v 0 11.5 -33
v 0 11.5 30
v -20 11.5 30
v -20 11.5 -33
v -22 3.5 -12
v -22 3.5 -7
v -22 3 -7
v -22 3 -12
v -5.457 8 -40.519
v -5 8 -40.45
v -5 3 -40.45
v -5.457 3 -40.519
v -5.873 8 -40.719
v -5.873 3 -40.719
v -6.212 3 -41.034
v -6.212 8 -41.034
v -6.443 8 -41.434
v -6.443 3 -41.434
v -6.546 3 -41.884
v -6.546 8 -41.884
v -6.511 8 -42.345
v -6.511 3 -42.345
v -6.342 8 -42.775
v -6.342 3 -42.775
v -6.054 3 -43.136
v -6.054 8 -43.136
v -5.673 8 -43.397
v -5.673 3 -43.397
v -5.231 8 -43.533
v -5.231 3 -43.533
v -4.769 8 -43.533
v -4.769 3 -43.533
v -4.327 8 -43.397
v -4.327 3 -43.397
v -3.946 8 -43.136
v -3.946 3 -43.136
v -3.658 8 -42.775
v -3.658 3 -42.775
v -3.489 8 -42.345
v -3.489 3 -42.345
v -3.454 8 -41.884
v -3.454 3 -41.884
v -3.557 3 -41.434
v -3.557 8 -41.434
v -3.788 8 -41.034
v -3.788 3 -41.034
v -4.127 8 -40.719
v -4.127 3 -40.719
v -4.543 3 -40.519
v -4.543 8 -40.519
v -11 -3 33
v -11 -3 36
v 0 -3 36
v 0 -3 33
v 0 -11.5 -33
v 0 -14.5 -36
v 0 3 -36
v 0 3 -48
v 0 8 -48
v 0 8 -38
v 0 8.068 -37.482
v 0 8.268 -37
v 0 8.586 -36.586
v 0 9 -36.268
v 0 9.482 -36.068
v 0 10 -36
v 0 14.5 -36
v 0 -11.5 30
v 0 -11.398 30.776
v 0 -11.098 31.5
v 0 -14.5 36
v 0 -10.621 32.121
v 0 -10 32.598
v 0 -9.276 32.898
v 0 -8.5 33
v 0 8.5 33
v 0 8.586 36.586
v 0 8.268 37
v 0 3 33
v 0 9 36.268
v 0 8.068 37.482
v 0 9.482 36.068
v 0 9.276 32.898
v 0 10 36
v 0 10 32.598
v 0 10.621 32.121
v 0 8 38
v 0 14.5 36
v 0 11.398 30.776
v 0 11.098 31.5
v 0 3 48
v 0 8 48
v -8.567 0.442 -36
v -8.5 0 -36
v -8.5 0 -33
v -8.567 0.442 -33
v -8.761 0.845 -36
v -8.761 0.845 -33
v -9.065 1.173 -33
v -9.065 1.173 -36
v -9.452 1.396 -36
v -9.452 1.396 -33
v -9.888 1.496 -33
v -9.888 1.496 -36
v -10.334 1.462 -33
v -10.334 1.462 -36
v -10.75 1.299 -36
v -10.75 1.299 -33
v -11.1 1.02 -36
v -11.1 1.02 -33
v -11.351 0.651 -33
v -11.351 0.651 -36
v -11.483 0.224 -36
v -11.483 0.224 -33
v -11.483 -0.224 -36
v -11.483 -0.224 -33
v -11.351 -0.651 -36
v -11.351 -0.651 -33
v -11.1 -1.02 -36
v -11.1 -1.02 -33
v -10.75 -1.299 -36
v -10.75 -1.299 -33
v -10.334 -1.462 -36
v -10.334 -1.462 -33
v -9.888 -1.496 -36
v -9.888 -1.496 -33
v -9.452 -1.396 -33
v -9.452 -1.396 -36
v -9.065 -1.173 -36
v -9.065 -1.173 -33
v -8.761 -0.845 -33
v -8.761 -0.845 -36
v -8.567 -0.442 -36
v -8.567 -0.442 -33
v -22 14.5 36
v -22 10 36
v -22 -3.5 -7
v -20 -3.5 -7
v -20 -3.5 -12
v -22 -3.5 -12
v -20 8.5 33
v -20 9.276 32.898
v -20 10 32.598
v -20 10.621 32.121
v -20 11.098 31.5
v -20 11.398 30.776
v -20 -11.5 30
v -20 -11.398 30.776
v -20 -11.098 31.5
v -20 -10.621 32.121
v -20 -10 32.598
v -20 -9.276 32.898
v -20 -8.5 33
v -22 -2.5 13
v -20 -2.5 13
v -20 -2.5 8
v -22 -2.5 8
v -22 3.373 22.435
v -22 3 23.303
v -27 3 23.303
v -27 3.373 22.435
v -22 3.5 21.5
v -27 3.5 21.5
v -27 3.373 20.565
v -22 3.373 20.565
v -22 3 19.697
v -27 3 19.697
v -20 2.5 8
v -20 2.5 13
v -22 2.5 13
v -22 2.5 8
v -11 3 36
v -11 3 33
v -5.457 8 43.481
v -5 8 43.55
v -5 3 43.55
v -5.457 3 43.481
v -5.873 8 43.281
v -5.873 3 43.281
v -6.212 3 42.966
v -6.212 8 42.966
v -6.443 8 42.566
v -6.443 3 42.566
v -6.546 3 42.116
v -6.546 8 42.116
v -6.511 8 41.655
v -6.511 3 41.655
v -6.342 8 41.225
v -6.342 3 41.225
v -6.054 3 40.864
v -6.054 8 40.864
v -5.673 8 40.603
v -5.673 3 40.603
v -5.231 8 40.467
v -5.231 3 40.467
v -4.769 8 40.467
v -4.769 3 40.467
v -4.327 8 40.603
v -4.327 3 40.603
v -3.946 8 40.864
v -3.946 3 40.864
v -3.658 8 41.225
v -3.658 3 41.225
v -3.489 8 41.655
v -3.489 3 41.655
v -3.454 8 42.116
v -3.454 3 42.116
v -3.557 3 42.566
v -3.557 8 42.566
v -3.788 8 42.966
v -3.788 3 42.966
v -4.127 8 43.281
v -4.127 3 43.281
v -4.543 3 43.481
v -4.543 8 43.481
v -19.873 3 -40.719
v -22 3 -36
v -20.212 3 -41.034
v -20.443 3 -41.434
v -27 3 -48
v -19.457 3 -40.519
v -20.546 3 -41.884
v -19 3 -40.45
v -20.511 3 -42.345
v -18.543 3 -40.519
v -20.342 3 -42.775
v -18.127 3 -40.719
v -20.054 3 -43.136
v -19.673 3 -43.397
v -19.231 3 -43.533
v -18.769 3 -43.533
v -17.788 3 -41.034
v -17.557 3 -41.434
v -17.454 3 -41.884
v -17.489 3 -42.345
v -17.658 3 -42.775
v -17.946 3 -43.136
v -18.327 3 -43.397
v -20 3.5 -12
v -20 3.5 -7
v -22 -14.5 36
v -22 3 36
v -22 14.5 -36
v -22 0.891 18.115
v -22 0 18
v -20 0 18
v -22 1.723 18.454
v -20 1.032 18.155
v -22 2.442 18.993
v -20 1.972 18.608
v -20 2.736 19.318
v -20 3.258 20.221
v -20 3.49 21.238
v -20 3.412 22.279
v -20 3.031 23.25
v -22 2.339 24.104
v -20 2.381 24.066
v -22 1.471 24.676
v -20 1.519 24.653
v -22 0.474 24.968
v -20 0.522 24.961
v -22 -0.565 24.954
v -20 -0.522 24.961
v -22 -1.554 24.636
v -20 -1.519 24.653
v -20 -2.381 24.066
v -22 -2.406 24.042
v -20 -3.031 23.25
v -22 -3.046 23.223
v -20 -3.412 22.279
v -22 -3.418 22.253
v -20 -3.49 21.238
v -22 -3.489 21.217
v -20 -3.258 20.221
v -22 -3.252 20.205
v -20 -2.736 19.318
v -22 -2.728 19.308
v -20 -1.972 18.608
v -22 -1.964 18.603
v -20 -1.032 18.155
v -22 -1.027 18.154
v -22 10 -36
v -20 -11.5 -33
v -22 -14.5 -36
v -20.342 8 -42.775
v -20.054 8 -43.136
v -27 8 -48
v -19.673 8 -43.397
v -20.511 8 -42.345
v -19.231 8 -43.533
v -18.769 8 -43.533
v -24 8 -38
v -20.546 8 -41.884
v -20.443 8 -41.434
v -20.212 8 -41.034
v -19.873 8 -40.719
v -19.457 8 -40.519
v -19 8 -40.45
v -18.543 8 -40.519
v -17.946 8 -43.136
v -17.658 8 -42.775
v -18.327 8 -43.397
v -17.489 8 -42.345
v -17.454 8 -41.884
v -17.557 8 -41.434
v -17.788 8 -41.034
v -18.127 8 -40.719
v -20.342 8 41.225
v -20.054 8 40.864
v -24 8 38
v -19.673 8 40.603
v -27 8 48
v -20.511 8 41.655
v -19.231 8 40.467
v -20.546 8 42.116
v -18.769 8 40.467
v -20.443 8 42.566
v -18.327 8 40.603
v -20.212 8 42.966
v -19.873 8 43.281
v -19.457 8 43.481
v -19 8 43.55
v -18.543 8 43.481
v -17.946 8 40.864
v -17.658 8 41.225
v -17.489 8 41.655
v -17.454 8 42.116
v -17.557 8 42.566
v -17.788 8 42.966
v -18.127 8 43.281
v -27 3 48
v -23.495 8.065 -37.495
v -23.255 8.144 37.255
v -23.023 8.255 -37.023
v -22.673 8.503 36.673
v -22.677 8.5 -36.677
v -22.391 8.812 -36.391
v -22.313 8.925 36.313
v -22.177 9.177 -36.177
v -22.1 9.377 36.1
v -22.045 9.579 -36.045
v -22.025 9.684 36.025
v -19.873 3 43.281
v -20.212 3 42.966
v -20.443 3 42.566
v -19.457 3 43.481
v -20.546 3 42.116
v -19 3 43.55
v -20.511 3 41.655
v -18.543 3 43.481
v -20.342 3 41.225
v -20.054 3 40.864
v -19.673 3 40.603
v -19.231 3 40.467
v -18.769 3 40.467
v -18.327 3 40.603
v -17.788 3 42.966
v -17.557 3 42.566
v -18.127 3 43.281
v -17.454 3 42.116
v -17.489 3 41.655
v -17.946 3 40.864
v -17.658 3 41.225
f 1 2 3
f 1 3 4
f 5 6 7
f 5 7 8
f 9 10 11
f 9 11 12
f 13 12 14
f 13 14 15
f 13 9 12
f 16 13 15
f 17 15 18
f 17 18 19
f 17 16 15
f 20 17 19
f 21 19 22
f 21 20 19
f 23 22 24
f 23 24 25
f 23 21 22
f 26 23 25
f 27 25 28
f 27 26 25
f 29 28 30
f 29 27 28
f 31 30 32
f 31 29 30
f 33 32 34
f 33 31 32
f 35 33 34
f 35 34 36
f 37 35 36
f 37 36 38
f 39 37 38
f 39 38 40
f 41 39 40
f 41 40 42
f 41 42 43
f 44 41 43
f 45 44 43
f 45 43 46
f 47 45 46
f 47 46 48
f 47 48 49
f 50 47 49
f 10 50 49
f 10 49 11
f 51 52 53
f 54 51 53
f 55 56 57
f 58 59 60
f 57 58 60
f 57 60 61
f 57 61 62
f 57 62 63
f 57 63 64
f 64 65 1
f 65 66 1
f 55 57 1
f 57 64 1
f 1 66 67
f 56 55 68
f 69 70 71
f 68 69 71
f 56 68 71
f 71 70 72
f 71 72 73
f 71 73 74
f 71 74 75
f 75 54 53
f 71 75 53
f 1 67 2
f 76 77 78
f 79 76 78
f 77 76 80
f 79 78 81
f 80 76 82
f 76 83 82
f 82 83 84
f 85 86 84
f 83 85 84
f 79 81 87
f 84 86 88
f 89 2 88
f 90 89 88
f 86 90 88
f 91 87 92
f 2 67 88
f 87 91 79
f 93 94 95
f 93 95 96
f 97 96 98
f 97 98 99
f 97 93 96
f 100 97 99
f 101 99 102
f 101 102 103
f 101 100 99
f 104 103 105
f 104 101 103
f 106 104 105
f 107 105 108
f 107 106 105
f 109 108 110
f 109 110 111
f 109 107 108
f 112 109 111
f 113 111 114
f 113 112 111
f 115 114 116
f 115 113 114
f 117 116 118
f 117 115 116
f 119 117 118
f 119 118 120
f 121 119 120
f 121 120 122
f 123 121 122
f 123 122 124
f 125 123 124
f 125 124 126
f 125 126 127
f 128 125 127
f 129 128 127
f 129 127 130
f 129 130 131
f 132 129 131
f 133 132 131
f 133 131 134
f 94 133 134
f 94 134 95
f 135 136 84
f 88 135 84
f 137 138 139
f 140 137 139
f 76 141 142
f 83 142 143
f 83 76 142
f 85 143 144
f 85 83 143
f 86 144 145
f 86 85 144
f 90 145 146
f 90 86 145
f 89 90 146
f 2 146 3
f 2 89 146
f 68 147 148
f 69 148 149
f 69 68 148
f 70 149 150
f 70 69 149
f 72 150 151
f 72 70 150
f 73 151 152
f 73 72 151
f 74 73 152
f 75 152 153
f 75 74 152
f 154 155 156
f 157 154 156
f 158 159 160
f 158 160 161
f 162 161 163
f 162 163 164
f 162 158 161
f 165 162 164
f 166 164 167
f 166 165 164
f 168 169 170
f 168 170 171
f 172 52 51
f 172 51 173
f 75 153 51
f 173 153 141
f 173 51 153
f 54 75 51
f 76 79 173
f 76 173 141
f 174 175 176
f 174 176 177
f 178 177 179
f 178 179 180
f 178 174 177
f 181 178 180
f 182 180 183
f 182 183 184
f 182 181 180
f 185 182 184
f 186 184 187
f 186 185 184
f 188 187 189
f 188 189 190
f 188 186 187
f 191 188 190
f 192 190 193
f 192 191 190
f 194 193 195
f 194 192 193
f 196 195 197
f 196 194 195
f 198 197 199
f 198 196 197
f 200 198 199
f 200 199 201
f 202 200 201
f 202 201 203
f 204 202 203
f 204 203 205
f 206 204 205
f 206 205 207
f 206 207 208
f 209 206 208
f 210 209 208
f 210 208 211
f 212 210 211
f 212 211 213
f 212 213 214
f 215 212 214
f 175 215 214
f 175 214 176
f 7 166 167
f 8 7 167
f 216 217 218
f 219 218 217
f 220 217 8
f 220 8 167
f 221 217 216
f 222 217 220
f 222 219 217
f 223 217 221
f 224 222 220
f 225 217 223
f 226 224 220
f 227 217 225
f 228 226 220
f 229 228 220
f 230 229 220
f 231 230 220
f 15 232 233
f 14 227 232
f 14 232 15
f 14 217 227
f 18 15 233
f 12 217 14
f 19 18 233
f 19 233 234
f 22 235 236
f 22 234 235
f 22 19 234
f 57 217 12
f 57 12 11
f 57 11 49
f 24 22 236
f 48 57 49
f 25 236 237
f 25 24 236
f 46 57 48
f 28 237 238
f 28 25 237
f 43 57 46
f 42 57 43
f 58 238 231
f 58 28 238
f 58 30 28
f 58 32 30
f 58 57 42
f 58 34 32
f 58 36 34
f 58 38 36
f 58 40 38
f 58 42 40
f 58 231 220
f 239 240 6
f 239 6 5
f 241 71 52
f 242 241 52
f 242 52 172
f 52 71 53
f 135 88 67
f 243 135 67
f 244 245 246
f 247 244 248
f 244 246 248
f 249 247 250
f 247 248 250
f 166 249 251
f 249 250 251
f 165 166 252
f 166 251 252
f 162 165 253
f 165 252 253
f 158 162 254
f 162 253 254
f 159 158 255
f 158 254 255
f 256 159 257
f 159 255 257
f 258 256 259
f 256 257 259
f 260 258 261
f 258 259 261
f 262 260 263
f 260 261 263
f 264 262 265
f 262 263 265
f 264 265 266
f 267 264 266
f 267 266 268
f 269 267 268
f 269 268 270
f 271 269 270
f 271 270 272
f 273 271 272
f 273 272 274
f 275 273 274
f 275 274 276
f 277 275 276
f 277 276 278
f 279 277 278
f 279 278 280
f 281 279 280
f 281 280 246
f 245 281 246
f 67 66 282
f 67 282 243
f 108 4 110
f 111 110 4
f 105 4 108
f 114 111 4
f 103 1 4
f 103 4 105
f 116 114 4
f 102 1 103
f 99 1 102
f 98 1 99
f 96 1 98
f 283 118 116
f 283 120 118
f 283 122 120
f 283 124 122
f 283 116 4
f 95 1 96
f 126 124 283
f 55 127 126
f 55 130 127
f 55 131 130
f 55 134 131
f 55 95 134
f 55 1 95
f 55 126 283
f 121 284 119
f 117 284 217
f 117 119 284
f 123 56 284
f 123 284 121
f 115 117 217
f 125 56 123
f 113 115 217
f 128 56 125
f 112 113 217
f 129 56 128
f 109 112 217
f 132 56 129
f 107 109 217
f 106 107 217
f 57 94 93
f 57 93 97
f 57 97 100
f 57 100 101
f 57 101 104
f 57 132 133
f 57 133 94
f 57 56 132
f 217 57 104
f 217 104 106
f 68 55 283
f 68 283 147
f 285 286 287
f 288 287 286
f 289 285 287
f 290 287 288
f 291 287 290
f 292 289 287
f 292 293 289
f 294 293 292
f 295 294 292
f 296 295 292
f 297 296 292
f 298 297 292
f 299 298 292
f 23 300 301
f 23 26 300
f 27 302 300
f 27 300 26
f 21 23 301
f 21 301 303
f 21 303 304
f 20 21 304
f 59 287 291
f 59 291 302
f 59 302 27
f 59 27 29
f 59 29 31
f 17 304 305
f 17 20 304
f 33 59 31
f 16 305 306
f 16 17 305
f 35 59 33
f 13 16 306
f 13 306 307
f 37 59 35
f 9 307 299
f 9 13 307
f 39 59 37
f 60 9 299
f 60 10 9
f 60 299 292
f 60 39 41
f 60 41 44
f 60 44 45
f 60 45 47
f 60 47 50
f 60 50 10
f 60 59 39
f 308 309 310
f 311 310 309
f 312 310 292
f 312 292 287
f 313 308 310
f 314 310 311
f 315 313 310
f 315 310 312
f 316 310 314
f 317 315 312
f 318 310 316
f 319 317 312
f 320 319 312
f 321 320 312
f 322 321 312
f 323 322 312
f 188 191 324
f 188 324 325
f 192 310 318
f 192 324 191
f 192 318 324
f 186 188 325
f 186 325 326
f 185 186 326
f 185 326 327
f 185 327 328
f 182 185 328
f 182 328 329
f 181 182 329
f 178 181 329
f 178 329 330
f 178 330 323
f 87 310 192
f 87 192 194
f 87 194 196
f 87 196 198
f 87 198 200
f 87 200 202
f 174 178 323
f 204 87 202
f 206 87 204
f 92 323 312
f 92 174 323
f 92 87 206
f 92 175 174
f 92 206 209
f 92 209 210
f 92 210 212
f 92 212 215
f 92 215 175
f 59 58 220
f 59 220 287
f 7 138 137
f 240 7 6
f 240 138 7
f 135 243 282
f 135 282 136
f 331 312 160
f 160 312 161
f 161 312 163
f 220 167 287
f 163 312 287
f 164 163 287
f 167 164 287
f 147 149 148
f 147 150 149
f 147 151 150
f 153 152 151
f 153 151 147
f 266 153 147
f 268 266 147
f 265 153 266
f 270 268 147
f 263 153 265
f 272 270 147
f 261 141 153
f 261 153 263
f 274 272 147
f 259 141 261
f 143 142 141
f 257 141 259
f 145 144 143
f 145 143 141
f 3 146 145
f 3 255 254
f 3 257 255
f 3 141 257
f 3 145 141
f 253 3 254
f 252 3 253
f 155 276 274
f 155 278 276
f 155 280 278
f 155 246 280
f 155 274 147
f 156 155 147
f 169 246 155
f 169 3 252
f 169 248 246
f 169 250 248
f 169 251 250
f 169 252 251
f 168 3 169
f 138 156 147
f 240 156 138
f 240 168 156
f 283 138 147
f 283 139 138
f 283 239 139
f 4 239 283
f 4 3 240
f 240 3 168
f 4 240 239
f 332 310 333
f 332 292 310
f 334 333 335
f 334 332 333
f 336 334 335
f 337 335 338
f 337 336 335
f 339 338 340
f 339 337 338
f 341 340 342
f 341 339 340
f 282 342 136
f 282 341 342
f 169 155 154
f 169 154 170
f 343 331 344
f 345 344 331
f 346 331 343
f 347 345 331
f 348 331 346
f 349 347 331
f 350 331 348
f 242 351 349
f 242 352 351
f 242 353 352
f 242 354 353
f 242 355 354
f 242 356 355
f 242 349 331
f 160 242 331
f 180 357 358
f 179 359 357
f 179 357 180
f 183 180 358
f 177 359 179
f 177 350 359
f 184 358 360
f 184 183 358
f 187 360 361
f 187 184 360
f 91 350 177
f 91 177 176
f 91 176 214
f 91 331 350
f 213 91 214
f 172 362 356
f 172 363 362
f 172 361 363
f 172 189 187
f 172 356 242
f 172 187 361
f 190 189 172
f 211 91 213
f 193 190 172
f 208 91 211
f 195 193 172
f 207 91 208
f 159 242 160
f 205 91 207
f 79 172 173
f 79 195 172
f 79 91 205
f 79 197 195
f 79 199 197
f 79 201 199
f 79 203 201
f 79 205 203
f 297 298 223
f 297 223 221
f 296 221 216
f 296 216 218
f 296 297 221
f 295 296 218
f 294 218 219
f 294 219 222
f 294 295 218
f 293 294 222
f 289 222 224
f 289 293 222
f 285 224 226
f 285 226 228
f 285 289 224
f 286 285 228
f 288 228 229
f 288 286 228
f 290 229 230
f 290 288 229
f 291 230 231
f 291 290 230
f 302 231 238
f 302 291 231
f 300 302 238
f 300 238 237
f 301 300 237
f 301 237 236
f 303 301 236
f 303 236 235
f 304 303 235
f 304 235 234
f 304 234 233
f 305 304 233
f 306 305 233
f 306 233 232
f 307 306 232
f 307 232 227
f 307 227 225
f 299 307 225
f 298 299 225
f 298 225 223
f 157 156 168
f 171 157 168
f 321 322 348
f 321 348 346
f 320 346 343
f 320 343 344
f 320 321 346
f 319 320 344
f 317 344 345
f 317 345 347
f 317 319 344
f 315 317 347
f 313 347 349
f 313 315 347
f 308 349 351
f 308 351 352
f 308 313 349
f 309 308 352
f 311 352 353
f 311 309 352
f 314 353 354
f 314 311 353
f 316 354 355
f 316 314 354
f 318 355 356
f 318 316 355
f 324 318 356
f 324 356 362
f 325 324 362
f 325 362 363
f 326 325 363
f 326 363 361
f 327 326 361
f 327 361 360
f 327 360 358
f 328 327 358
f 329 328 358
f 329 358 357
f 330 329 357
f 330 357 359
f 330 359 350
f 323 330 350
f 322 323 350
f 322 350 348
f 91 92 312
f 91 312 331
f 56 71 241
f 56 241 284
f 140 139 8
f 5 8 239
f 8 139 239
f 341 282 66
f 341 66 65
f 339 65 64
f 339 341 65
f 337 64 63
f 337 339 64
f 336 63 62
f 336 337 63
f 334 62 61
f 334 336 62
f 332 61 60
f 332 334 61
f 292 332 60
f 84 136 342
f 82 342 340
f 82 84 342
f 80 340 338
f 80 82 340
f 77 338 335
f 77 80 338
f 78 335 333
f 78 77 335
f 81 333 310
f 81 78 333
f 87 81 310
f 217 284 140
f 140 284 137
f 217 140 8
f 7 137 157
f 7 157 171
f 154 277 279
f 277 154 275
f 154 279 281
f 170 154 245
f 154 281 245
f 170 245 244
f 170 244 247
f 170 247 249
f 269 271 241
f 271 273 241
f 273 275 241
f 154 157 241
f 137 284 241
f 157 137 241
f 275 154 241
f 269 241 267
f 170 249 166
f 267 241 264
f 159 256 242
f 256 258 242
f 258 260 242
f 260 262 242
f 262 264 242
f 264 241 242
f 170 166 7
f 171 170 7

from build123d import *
from build123d.topology import SkipClean

# Parameters (mm, degrees)
SKETCH_1_W             = 72
SKETCH_1_H             = 29
EXTRUDE_1_DEPTH        = 20
CUT_EXTRUDE_1_REACH    = 78.12
SKETCH_2_W             = 11
SKETCH_2_H             = 6
CUT_EXTRUDE_2_REACH    = 78.12
SKETCH_3_R             = 1.5
SKETCH_4_W             = 72
SKETCH_4_H             = 29
SKETCH_4_R             = 3.5
SKETCH_4_W_2           = 5
SKETCH_4_H_2           = 5
SKETCH_4_H_3           = 7
EXTRUDE_2_DEPTH        = 2
SKETCH_6_W             = 22
SKETCH_6_H             = 5
EXTRUDE_3_DEPTH        = 12
SKETCH_7_W             = 22
SKETCH_7_H             = 5
EXTRUDE_4_DEPTH        = 12
EXTRUDE_5_DEPTH        = 5
CUT_EXTRUDE_4_REACH    = 61.492
SKETCH_10_R            = 1.55
FILLET_1_R             = 2
FILLET_1_OF_MIRROR_4_R = 2
SKETCH_11_W            = 152.939509244
SKETCH_11_H            = 68.45292135
CUT_EXTRUDE_5_DEPTH    = 27


with BuildPart() as part:
    # 草圖1 → 填料-伸長1 (new body)
    with BuildSketch(Plane(origin=(0, 0, 0), x_dir=(0, 0, -1), z_dir=(1, 0, 0))):
        Rectangle(SKETCH_1_W, SKETCH_1_H)
        with BuildLine():
            Line((-30, 11.5), (33, 11.5))
            Line((33, 11.5), (33, -11.5))
            Line((33, -11.5), (-30, -11.5))
            ThreePointArc((-30, -11.5), (-32.121320344, -10.621320344), (-33, -8.5))
            Line((-33, -8.5), (-33, 8.5))
            ThreePointArc((-33, 8.5), (-32.121320344, 10.621320344), (-30, 11.5))
        make_face(mode=Mode.SUBTRACT)
    extrude_1 = extrude(amount=EXTRUDE_1_DEPTH)

    # 草圖2 → 除料-伸長1 (cut, up to next)
    with BuildSketch(Plane.XY.offset(36), mode=Mode.PRIVATE) as cut_extrude_1_sk1:
        with Locations((5.5, 0)):
            Rectangle(SKETCH_2_W, SKETCH_2_H)
    cut_extrude_1_tool1 = extrude(cut_extrude_1_sk1.sketch, amount=-CUT_EXTRUDE_1_REACH, mode=Mode.PRIVATE) & part.part
    cut_extrude_1 = cut_extrude_1_tool1.solids().sort_by_distance((5.5, 0, 36))[0]
    add(cut_extrude_1, mode=Mode.SUBTRACT)

    # 草圖3 → 除料-伸長2 (cut, up to next)
    with BuildSketch(Plane(origin=(0, 0, -36), x_dir=(-1, 0, 0), z_dir=(0, 0, -1)), mode=Mode.PRIVATE) as cut_extrude_2_sk1:
        with Locations((-10, 0)):
            Circle(SKETCH_3_R)
    cut_extrude_2_tool1 = extrude(cut_extrude_2_sk1.sketch, amount=-CUT_EXTRUDE_2_REACH, mode=Mode.PRIVATE) & part.part
    cut_extrude_2 = cut_extrude_2_tool1.solids().sort_by_distance((10, 0, -36))[0]
    add(cut_extrude_2, mode=Mode.SUBTRACT)

    # 草圖4 → 填料-伸長2 (add)
    with BuildSketch(Plane(origin=(20, 0, 0), x_dir=(0, 0, -1), z_dir=(1, 0, 0))):
        Rectangle(SKETCH_4_W, SKETCH_4_H)
        with Locations((-21.5, 0)):
            Circle(SKETCH_4_R, mode=Mode.SUBTRACT)
        with Locations((-10.5, 0)):
            Rectangle(SKETCH_4_W_2, SKETCH_4_H_2, mode=Mode.SUBTRACT)
        with Locations((9.5, 0)):
            Rectangle(SKETCH_4_W_2, SKETCH_4_H_3, mode=Mode.SUBTRACT)
    extrude_2 = extrude(amount=EXTRUDE_2_DEPTH)

    # 草圖6 → 填料-伸長3 (add)
    with BuildSketch(Plane.XY.offset(36)):
        with Locations((11, 5.5)):
            Rectangle(SKETCH_6_W, SKETCH_6_H)
    extrude_3 = extrude(amount=EXTRUDE_3_DEPTH)

    # 草圖7 → 填料-伸長4 (add)
    with BuildSketch(Plane(origin=(0, 0, -36), x_dir=(-1, 0, 0), z_dir=(0, 0, -1))):
        with Locations((-11, 5.5)):
            Rectangle(SKETCH_7_W, SKETCH_7_H)
    extrude_4 = extrude(amount=EXTRUDE_4_DEPTH)

    # 草圖9 → 填料-伸長5 (add)
    with SkipClean():  # the faces are left unmerged after this step: merging them gives an invalid solid
        with BuildSketch(Plane(origin=(22, 0, 0), x_dir=(0, 0, -1), z_dir=(1, 0, 0))):
            with BuildLine():
                Line((-48, 3), (-23.302775638, 3))
                ThreePointArc((-23.302775638, 3), (-21.5, 3.5), (-19.697224362, 3))
                Line((-19.697224362, 3), (48, 3))
                Line((48, 3), (48, 8))
                Line((48, 8), (-48, 8))
                Line((-48, 8), (-48, 3))
            make_face()
        extrude_5 = extrude(amount=EXTRUDE_5_DEPTH)

    # 草圖10 → 除料-伸長4 (cut, up to next)
    with BuildSketch(Plane(origin=(0, 8, 0), x_dir=(1, 0, 0), z_dir=(0, 1, 0)), mode=Mode.PRIVATE) as cut_extrude_4_sk1:
        with Locations(Location((5, -42, 0), (0, 0, 270))):
            Circle(SKETCH_10_R)
    cut_extrude_4_tool1 = extrude(cut_extrude_4_sk1.sketch, amount=-CUT_EXTRUDE_4_REACH, mode=Mode.PRIVATE) & part.part
    # 草圖10 → 除料-伸長4 (cut, up to next)
    with BuildSketch(Plane(origin=(0, 8, 0), x_dir=(1, 0, 0), z_dir=(0, 1, 0)), mode=Mode.PRIVATE) as cut_extrude_4_sk2:
        with Locations(Location((19, -42, 0), (0, 0, 270))):
            Circle(SKETCH_10_R)
    cut_extrude_4_tool2 = extrude(cut_extrude_4_sk2.sketch, amount=-CUT_EXTRUDE_4_REACH, mode=Mode.PRIVATE) & part.part
    # 草圖10 → 除料-伸長4 (cut, up to next)
    with BuildSketch(Plane(origin=(0, 8, 0), x_dir=(1, 0, 0), z_dir=(0, 1, 0)), mode=Mode.PRIVATE) as cut_extrude_4_sk3:
        with Locations(Location((19, 42, 0), (0, 0, 270))):
            Circle(SKETCH_10_R)
    cut_extrude_4_tool3 = extrude(cut_extrude_4_sk3.sketch, amount=-CUT_EXTRUDE_4_REACH, mode=Mode.PRIVATE) & part.part
    # 草圖10 → 除料-伸長4 (cut, up to next)
    with BuildSketch(Plane(origin=(0, 8, 0), x_dir=(1, 0, 0), z_dir=(0, 1, 0)), mode=Mode.PRIVATE) as cut_extrude_4_sk4:
        with Locations(Location((5, 42, 0), (0, 0, 270))):
            Circle(SKETCH_10_R)
    cut_extrude_4_tool4 = extrude(cut_extrude_4_sk4.sketch, amount=-CUT_EXTRUDE_4_REACH, mode=Mode.PRIVATE) & part.part
    cut_extrude_4_1 = cut_extrude_4_tool1.solids().sort_by_distance((5, 8, 42))[0]
    add(cut_extrude_4_1, mode=Mode.SUBTRACT)
    cut_extrude_4_2 = cut_extrude_4_tool2.solids().sort_by_distance((19, 8, 42))[0]
    add(cut_extrude_4_2, mode=Mode.SUBTRACT)
    cut_extrude_4_3 = cut_extrude_4_tool3.solids().sort_by_distance((19, 8, -42))[0]
    add(cut_extrude_4_3, mode=Mode.SUBTRACT)
    cut_extrude_4_4 = cut_extrude_4_tool4.solids().sort_by_distance((5, 8, -42))[0]
    add(cut_extrude_4_4, mode=Mode.SUBTRACT)
    cut_extrude_4 = cut_extrude_4_1 + cut_extrude_4_2 + cut_extrude_4_3 + cut_extrude_4_4  # 除料-伸長4 as one shape, for the pattern or mirror that repeats it

    # 圓角1
    # the kernel refuses this fillet: 2 mm, written as the material it adds along each edge
    with BuildSketch(Plane(origin=(22, 8, -36), x_dir=(0, 1, 0), z_dir=(-1, 0, 0)), Plane(origin=(0, 8, 36), x_dir=(0, 1, 0), z_dir=(1, 0, 0))) as fillet_1_piece_1:
        with BuildLine():
            CenterArc((FILLET_1_R, FILLET_1_R), FILLET_1_R, 180, 90)
            Line((0, FILLET_1_R), (0, 0))
            Line((0, 0), (FILLET_1_R, 0))
        make_face()
    extrude(amount=22)
    with BuildSketch(Plane(origin=(22, 8, -36), x_dir=(0, 1, 0), z_dir=(0, 0, 1))) as fillet_1_piece_2:
        with BuildLine():
            CenterArc((FILLET_1_R, -FILLET_1_R), FILLET_1_R, 90, 90)
            Line((0, -FILLET_1_R), (0, 0))
            Line((0, 0), (FILLET_1_R, 0))
        make_face()
    extrude(amount=72)
    with BuildSketch(Plane(origin=(22, 8, -41), x_dir=(0, 1, 0), z_dir=(0, 0, 1))) as fillet_1_piece_3a_section:
        with BuildLine():
            CenterArc((FILLET_1_R, -FILLET_1_R), FILLET_1_R, 90, 90)
            Line((0, -FILLET_1_R), (0, 0))
            Line((0, 0), (FILLET_1_R, 0))
        make_face()
    fillet_1_piece_3a = extrude(amount=77, mode=Mode.PRIVATE)
    fillet_1_piece_3a = split(fillet_1_piece_3a, bisect_by=Plane(origin=(22.452790229, 8.452790229, -36), z_dir=(0, 0, -1)), keep=Keep.TOP, mode=Mode.PRIVATE)
    with BuildSketch(Plane(origin=(27, 8, -36), x_dir=(0, 1, 0), z_dir=(-1, 0, 0))) as fillet_1_piece_3b_section:
        with BuildLine():
            CenterArc((FILLET_1_R, FILLET_1_R), FILLET_1_R, 180, 90)
            Line((0, FILLET_1_R), (0, 0))
            Line((0, 0), (FILLET_1_R, 0))
        make_face()
    fillet_1_piece_3b = extrude(amount=27, mode=Mode.PRIVATE)
    fillet_1_piece_3b = split(fillet_1_piece_3b, bisect_by=Plane(origin=(22, 8.452790229, -36.452790229), z_dir=(1, 0, 0)), keep=Keep.TOP, mode=Mode.PRIVATE)
    fillet_1_piece_3 = fillet_1_piece_3a & fillet_1_piece_3b
    add(fillet_1_piece_3)
    with BuildSketch(Plane(origin=(0, 8, 36), x_dir=(0, 1, 0), z_dir=(1, 0, 0))) as fillet_1_piece_4a_section:
        with BuildLine():
            CenterArc((FILLET_1_R, FILLET_1_R), FILLET_1_R, 180, 90)
            Line((0, FILLET_1_R), (0, 0))
            Line((0, 0), (FILLET_1_R, 0))
        make_face()
    fillet_1_piece_4a = extrude(amount=27, mode=Mode.PRIVATE)
    fillet_1_piece_4a = split(fillet_1_piece_4a, bisect_by=Plane(origin=(22, 8.452790229, 36.452790229), z_dir=(1, 0, 0)), keep=Keep.TOP, mode=Mode.PRIVATE)
    with BuildSketch(Plane(origin=(22, 8, -36), x_dir=(0, 1, 0), z_dir=(0, 0, 1))) as fillet_1_piece_4b_section:
        with BuildLine():
            CenterArc((FILLET_1_R, -FILLET_1_R), FILLET_1_R, 90, 90)
            Line((0, -FILLET_1_R), (0, 0))
            Line((0, 0), (FILLET_1_R, 0))
        make_face()
    fillet_1_piece_4b = extrude(amount=77, mode=Mode.PRIVATE)
    fillet_1_piece_4b = split(fillet_1_piece_4b, bisect_by=Plane(origin=(22.452790229, 8.452790229, 36), z_dir=(0, 0, 1)), keep=Keep.TOP, mode=Mode.PRIVATE)
    fillet_1_piece_4 = fillet_1_piece_4a & fillet_1_piece_4b
    add(fillet_1_piece_4)

    # 鏡射4: 填料-伸長1, 除料-伸長1, 除料-伸長2, 填料-伸長2, 填料-伸長3, 填料-伸長4, 填料-伸長5, 除料-伸長4 across plane
    add(extrude_1.mirror(Plane.ZY))
    add(cut_extrude_1.mirror(Plane.ZY), mode=Mode.SUBTRACT)
    add(cut_extrude_2.mirror(Plane.ZY), mode=Mode.SUBTRACT)
    add(extrude_2.mirror(Plane.ZY))
    add(extrude_3.mirror(Plane.ZY))
    add(extrude_4.mirror(Plane.ZY))
    add(extrude_5.mirror(Plane.ZY))
    add(cut_extrude_4.mirror(Plane.ZY), mode=Mode.SUBTRACT)

    # 圓角1 of 鏡射4
    # the kernel refuses this fillet: 2 mm, written as the material it adds along each edge
    with BuildSketch(Plane(origin=(-22, 8, -36), x_dir=(0, 0, -1), z_dir=(1, 0, 0))) as fillet_1_of_mirror_4_piece_1:
        with BuildLine():
            CenterArc((FILLET_1_OF_MIRROR_4_R, FILLET_1_OF_MIRROR_4_R), FILLET_1_OF_MIRROR_4_R, 180, 90)
            Line((0, FILLET_1_OF_MIRROR_4_R), (0, 0))
            Line((0, 0), (FILLET_1_OF_MIRROR_4_R, 0))
        make_face()
    extrude(amount=27)
    with BuildSketch(Plane(origin=(-22, 8, -36), x_dir=(-1, 0, 0), z_dir=(0, 0, 1))) as fillet_1_of_mirror_4_piece_2:
        with BuildLine():
            CenterArc((FILLET_1_OF_MIRROR_4_R, -FILLET_1_OF_MIRROR_4_R), FILLET_1_OF_MIRROR_4_R, 90, 90)
            Line((0, -FILLET_1_OF_MIRROR_4_R), (0, 0))
            Line((0, 0), (FILLET_1_OF_MIRROR_4_R, 0))
        make_face()
    extrude(amount=72)
    with BuildSketch(Plane(origin=(5, 8, 36), x_dir=(0, 1, 0), z_dir=(-1, 0, 0))) as fillet_1_of_mirror_4_piece_3:
        with BuildLine():
            CenterArc((FILLET_1_OF_MIRROR_4_R, -FILLET_1_OF_MIRROR_4_R), FILLET_1_OF_MIRROR_4_R, 90, 90)
            Line((0, -FILLET_1_OF_MIRROR_4_R), (0, 0))
            Line((0, 0), (FILLET_1_OF_MIRROR_4_R, 0))
        make_face()
    extrude(amount=27)
    with BuildSketch(Plane(origin=(-22, 8, -41), x_dir=(-1, 0, 0), z_dir=(0, 0, 1))) as fillet_1_of_mirror_4_piece_4a_section:
        with BuildLine():
            CenterArc((FILLET_1_OF_MIRROR_4_R, -FILLET_1_OF_MIRROR_4_R), FILLET_1_OF_MIRROR_4_R, 90, 90)
            Line((0, -FILLET_1_OF_MIRROR_4_R), (0, 0))
            Line((0, 0), (FILLET_1_OF_MIRROR_4_R, 0))
        make_face()
    fillet_1_of_mirror_4_piece_4a = extrude(amount=77, mode=Mode.PRIVATE)
    fillet_1_of_mirror_4_piece_4a = split(fillet_1_of_mirror_4_piece_4a, bisect_by=Plane(origin=(-22.452790229, 8.452790229, -36), z_dir=(0, 0, -1)), keep=Keep.TOP, mode=Mode.PRIVATE)
    with BuildSketch(Plane(origin=(-27, 8, -36), x_dir=(0, 0, -1), z_dir=(1, 0, 0))) as fillet_1_of_mirror_4_piece_4b_section:
        with BuildLine():
            CenterArc((FILLET_1_OF_MIRROR_4_R, FILLET_1_OF_MIRROR_4_R), FILLET_1_OF_MIRROR_4_R, 180, 90)
            Line((0, FILLET_1_OF_MIRROR_4_R), (0, 0))
            Line((0, 0), (FILLET_1_OF_MIRROR_4_R, 0))
        make_face()
    fillet_1_of_mirror_4_piece_4b = extrude(amount=27, mode=Mode.PRIVATE)
    fillet_1_of_mirror_4_piece_4b = split(fillet_1_of_mirror_4_piece_4b, bisect_by=Plane(origin=(-22, 8.452790229, -36.452790229), z_dir=(-1, 0, 0)), keep=Keep.TOP, mode=Mode.PRIVATE)
    fillet_1_of_mirror_4_piece_4 = fillet_1_of_mirror_4_piece_4a & fillet_1_of_mirror_4_piece_4b
    add(fillet_1_of_mirror_4_piece_4)
    with BuildSketch(Plane(origin=(0, 8, 36), x_dir=(0, 1, 0), z_dir=(-1, 0, 0))) as fillet_1_of_mirror_4_piece_5a_section:
        with BuildLine():
            CenterArc((FILLET_1_OF_MIRROR_4_R, -FILLET_1_OF_MIRROR_4_R), FILLET_1_OF_MIRROR_4_R, 90, 90)
            Line((0, -FILLET_1_OF_MIRROR_4_R), (0, 0))
            Line((0, 0), (FILLET_1_OF_MIRROR_4_R, 0))
        make_face()
    fillet_1_of_mirror_4_piece_5a = extrude(amount=27, mode=Mode.PRIVATE)
    fillet_1_of_mirror_4_piece_5a = split(fillet_1_of_mirror_4_piece_5a, bisect_by=Plane(origin=(-22, 8.452790229, 36.452790229), z_dir=(-1, 0, 0)), keep=Keep.TOP, mode=Mode.PRIVATE)
    with BuildSketch(Plane(origin=(-22, 8, -36), x_dir=(-1, 0, 0), z_dir=(0, 0, 1))) as fillet_1_of_mirror_4_piece_5b_section:
        with BuildLine():
            CenterArc((FILLET_1_OF_MIRROR_4_R, -FILLET_1_OF_MIRROR_4_R), FILLET_1_OF_MIRROR_4_R, 90, 90)
            Line((0, -FILLET_1_OF_MIRROR_4_R), (0, 0))
            Line((0, 0), (FILLET_1_OF_MIRROR_4_R, 0))
        make_face()
    fillet_1_of_mirror_4_piece_5b = extrude(amount=77, mode=Mode.PRIVATE)
    fillet_1_of_mirror_4_piece_5b = split(fillet_1_of_mirror_4_piece_5b, bisect_by=Plane(origin=(-22.452790229, 8.452790229, 36), z_dir=(0, 0, 1)), keep=Keep.TOP, mode=Mode.PRIVATE)
    fillet_1_of_mirror_4_piece_5 = fillet_1_of_mirror_4_piece_5a & fillet_1_of_mirror_4_piece_5b
    add(fillet_1_of_mirror_4_piece_5)

    # 草圖11 → 除料-伸長5 (cut)
    with BuildSketch(Plane.ZY):
        with Locations((0.508783228, -2.026988218)):
            Rectangle(SKETCH_11_W, SKETCH_11_H)
    extrude(amount=-CUT_EXTRUDE_5_DEPTH, mode=Mode.SUBTRACT)


solid = part.part
